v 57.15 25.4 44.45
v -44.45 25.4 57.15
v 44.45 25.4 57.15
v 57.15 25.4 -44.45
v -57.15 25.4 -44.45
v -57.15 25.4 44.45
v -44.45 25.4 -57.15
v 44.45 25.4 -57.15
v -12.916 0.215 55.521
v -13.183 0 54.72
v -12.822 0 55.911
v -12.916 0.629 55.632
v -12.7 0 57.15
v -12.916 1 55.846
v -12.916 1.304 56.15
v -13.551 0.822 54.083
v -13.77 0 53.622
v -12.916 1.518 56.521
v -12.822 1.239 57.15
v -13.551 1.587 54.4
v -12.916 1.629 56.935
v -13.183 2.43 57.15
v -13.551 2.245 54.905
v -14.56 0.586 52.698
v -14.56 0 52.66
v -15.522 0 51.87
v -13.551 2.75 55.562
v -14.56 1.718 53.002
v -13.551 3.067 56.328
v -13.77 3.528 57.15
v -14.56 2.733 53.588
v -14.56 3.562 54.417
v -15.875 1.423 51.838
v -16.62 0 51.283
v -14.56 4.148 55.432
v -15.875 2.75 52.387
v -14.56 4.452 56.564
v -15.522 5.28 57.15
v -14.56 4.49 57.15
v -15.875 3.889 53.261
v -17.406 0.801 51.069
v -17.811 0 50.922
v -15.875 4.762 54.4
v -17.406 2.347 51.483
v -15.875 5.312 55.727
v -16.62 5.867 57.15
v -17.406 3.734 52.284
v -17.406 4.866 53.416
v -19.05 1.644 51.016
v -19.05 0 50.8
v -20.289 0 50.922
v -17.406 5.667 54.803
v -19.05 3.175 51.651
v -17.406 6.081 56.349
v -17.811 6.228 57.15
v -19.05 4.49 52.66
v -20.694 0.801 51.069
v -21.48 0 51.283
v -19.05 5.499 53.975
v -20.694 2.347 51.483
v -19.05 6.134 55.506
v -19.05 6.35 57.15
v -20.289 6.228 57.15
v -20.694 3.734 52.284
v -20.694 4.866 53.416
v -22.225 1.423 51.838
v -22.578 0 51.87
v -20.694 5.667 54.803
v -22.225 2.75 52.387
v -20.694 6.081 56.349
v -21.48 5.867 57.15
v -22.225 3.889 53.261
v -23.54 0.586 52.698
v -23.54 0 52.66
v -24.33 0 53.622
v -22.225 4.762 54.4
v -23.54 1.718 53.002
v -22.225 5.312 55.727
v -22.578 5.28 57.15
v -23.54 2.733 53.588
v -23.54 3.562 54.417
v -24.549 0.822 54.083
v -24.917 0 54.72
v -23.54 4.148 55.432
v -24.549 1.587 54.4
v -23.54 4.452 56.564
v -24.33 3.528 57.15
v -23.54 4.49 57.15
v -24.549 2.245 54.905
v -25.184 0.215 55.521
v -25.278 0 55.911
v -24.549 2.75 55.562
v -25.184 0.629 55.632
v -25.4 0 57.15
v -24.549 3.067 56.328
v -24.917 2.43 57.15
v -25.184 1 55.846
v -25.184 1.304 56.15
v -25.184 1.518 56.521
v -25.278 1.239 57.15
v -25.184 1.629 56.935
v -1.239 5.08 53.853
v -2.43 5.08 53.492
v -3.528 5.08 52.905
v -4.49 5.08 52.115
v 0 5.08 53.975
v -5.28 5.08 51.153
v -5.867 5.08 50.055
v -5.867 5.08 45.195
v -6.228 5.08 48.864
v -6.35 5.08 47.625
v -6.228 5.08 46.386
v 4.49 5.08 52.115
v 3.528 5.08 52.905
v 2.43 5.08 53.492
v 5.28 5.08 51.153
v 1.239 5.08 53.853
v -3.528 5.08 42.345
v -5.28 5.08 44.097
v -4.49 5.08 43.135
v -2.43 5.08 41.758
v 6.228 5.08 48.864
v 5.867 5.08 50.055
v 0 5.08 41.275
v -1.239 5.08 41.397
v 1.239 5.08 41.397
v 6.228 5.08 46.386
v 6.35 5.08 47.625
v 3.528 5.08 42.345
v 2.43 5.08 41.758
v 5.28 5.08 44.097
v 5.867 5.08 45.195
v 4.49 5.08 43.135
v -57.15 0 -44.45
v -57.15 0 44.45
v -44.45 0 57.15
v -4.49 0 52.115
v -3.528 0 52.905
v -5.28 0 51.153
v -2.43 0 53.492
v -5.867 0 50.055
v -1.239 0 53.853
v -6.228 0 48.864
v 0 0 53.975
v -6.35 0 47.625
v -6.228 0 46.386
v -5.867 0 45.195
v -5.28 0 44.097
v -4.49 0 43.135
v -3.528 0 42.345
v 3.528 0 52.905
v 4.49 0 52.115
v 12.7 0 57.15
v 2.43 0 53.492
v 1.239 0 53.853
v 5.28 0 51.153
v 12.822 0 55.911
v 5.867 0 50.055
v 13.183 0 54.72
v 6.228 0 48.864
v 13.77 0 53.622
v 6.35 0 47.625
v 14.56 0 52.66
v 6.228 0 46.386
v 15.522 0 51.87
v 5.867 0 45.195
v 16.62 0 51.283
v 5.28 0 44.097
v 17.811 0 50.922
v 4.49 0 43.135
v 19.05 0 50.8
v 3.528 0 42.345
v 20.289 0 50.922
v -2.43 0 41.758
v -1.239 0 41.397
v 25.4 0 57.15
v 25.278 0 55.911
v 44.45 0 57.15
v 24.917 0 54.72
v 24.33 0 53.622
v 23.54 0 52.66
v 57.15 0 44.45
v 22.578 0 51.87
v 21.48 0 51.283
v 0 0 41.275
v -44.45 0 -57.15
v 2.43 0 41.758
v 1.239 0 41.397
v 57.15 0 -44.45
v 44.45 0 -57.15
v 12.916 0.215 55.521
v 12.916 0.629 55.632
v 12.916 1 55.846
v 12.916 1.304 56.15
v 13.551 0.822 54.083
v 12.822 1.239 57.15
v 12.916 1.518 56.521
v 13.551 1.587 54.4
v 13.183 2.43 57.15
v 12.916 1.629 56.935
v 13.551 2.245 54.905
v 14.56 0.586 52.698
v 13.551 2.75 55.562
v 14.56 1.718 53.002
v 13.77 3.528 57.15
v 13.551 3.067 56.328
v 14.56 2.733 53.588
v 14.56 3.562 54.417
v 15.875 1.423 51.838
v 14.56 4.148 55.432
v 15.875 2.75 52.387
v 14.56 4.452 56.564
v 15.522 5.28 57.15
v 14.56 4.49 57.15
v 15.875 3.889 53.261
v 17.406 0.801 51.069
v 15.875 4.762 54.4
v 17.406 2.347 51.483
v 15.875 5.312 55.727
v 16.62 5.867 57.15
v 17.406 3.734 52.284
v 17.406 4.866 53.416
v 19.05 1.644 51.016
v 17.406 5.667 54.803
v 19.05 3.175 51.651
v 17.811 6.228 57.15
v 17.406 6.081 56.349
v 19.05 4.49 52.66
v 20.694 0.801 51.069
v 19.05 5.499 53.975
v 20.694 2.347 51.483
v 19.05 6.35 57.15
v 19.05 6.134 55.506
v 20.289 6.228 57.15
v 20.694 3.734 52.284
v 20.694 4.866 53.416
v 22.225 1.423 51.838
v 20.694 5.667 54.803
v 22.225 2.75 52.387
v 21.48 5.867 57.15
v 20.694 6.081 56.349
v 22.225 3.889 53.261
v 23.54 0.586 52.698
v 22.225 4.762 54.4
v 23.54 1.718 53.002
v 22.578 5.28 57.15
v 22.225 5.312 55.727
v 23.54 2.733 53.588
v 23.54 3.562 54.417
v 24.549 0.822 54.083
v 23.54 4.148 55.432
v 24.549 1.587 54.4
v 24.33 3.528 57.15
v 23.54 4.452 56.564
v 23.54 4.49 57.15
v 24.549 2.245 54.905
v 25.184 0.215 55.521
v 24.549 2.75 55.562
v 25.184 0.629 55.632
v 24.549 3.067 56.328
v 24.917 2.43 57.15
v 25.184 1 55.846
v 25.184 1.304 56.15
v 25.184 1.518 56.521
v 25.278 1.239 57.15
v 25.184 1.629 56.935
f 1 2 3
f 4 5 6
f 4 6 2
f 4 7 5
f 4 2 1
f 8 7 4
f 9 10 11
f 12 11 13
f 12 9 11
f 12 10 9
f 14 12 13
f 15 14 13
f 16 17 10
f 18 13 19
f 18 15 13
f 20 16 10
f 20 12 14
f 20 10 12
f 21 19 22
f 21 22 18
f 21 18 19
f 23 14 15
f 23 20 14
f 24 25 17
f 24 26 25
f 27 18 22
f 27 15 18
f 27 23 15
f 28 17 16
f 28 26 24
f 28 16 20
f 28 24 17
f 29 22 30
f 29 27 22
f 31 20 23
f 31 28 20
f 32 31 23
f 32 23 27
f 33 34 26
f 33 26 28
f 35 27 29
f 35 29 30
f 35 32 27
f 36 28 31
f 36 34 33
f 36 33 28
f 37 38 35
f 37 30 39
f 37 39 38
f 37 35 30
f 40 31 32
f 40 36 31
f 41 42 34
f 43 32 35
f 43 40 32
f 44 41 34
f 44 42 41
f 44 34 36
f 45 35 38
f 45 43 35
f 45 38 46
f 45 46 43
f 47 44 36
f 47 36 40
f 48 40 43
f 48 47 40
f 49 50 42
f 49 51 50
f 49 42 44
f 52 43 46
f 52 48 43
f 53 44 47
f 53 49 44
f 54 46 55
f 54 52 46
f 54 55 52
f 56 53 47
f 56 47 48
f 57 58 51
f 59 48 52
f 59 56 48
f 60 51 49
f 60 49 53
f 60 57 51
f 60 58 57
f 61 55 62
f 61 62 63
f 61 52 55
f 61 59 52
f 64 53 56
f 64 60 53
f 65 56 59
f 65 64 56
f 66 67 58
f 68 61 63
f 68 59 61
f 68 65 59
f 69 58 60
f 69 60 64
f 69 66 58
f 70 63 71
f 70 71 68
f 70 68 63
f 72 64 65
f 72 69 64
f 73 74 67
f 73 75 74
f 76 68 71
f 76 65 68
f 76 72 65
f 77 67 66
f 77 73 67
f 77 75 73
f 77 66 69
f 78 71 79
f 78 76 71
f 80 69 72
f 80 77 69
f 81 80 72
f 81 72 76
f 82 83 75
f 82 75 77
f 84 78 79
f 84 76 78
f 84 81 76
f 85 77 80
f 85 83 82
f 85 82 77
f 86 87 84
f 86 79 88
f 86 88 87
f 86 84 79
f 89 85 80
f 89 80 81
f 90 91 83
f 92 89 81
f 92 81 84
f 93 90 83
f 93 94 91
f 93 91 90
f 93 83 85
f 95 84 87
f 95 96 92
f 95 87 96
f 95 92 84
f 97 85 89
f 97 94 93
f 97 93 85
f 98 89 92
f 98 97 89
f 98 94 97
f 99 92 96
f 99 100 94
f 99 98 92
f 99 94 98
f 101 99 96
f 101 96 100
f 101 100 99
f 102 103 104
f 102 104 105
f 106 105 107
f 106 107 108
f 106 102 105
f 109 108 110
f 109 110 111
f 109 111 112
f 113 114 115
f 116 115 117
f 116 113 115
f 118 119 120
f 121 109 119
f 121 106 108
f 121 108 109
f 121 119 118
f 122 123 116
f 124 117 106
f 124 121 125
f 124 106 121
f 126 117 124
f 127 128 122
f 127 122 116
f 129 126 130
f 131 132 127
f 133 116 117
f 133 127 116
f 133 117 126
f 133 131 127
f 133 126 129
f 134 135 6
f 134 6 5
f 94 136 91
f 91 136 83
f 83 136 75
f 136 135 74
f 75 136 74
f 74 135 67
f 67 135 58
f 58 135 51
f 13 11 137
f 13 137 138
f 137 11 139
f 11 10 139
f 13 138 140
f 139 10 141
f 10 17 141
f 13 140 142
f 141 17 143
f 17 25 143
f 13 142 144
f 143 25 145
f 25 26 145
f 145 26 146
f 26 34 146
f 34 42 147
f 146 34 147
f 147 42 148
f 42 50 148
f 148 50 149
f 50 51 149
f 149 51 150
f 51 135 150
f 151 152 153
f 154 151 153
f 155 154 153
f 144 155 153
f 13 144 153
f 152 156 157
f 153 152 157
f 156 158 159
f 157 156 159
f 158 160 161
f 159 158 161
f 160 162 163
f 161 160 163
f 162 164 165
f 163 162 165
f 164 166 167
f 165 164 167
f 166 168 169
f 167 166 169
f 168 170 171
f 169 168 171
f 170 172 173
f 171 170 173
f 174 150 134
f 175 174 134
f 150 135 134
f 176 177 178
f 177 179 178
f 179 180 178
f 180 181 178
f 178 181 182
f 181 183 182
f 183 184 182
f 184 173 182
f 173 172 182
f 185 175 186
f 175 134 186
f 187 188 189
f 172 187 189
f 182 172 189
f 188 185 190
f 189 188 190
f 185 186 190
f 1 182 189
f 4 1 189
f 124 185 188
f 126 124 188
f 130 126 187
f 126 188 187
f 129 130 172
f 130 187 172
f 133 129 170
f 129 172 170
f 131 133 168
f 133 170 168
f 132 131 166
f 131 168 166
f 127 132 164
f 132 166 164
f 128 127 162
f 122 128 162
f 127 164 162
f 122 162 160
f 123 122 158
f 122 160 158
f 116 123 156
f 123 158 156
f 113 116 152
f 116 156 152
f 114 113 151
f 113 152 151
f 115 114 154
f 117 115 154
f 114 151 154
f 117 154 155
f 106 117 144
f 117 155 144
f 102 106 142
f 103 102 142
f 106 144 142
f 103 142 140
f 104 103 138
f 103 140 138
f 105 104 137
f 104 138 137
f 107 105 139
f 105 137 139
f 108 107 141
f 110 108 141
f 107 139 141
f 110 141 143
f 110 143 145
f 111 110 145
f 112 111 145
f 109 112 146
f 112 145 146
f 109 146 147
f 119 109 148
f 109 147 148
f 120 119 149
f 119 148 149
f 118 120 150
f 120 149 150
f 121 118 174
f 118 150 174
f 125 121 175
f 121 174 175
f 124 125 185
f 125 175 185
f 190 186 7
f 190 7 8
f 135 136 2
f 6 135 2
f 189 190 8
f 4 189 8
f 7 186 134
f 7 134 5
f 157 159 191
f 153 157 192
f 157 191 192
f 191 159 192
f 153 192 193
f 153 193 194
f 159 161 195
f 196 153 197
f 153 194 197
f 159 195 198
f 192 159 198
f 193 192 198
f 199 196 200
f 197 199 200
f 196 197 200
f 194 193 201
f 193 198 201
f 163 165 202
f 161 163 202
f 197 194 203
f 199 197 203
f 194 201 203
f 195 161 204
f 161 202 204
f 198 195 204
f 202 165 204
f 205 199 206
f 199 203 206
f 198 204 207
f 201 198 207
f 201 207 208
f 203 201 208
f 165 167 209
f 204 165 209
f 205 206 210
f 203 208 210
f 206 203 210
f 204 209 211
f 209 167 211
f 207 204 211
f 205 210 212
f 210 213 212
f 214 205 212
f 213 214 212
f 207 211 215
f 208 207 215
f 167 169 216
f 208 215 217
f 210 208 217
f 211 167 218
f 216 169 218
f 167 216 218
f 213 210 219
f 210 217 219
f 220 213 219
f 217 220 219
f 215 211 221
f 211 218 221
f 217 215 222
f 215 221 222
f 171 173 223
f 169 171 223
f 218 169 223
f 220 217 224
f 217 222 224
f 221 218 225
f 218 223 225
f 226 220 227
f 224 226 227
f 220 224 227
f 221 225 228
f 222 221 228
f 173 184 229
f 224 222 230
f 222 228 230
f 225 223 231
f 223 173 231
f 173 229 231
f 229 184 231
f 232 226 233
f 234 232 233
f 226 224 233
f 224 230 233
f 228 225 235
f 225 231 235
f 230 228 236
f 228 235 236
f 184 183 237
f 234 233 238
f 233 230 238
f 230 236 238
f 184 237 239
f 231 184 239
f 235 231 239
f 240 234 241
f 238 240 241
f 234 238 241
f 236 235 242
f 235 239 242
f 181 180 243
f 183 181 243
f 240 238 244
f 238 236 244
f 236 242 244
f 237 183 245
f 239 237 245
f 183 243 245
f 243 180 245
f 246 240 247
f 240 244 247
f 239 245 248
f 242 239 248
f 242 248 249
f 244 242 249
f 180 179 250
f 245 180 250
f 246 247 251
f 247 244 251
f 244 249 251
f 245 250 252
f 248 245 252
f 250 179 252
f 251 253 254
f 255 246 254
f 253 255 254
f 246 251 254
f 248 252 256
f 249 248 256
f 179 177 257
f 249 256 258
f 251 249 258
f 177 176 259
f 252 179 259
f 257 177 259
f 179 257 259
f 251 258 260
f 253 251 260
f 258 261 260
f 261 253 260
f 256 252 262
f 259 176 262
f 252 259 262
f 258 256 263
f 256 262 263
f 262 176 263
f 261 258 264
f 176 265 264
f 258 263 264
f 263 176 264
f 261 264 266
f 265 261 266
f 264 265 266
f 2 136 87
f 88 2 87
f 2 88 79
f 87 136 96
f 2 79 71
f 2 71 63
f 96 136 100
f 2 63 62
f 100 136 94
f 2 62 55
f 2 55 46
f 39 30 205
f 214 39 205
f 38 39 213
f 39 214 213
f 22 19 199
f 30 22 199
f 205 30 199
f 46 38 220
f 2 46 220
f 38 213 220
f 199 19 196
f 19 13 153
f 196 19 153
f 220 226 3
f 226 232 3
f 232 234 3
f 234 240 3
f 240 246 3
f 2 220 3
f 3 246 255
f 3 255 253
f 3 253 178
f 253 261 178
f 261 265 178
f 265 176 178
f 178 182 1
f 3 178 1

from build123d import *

# Parameters (mm, degrees)
SKETCH1_W           = 114.3
SKETCH1_H           = 114.3
BOSS_EXTRUDE1_DEPTH = 25.4
CHAMFER1_SIZE       = 12.7
SKETCH2_R           = 6.35
CUT_EXTRUDE1_DEPTH  = 5.08


with BuildPart() as part:
    # Sketch1 → Boss-Extrude1 (new body)
    with BuildSketch(Plane(origin=(0, 0, 0), x_dir=(1, 0, 0), z_dir=(0, 1, 0))):
        Rectangle(SKETCH1_W, SKETCH1_H)
    extrude(amount=BOSS_EXTRUDE1_DEPTH)

    # Chamfer1
    chamfer1_edges = [part.edges().sort_by_distance(p)[0] for p in [
        (57.15, 12.7, 57.15),
        (-57.15, 12.7, 57.15),
        (-57.15, 12.7, -57.15),
        (57.15, 12.7, -57.15),
    ]]
    chamfer(chamfer1_edges, length=CHAMFER1_SIZE)

    # Sketch2 → Cut-Extrude1 (cut)
    with BuildSketch(Plane(origin=(0, 0, 0), x_dir=(-1, 0, 0), z_dir=(0, -1, 0))):
        with Locations(Location((0, -47.625, 0), (0, 0, 90))):
            Circle(SKETCH2_R)
    extrude(amount=-CUT_EXTRUDE1_DEPTH, mode=Mode.SUBTRACT)

    # Sketch3 → Cut-Revolve4 (revolve, cut)
    with BuildSketch(Plane.XY.offset(57.15)):
        with BuildLine():
            Line((-25.4, 0), (-12.7, 0))
            ThreePointArc((-12.7, 0), (-19.05, 6.35), (-25.4, 0))
        make_face()
        with BuildLine():
            Line((25.4, 0), (12.7, 0))
            ThreePointArc((12.7, 0), (19.05, 6.35), (25.4, 0))
        make_face()
    revolve(axis=Axis((-57.15, 0, 57.15), (1, 0, 0)), mode=Mode.SUBTRACT)


solid = part.part
